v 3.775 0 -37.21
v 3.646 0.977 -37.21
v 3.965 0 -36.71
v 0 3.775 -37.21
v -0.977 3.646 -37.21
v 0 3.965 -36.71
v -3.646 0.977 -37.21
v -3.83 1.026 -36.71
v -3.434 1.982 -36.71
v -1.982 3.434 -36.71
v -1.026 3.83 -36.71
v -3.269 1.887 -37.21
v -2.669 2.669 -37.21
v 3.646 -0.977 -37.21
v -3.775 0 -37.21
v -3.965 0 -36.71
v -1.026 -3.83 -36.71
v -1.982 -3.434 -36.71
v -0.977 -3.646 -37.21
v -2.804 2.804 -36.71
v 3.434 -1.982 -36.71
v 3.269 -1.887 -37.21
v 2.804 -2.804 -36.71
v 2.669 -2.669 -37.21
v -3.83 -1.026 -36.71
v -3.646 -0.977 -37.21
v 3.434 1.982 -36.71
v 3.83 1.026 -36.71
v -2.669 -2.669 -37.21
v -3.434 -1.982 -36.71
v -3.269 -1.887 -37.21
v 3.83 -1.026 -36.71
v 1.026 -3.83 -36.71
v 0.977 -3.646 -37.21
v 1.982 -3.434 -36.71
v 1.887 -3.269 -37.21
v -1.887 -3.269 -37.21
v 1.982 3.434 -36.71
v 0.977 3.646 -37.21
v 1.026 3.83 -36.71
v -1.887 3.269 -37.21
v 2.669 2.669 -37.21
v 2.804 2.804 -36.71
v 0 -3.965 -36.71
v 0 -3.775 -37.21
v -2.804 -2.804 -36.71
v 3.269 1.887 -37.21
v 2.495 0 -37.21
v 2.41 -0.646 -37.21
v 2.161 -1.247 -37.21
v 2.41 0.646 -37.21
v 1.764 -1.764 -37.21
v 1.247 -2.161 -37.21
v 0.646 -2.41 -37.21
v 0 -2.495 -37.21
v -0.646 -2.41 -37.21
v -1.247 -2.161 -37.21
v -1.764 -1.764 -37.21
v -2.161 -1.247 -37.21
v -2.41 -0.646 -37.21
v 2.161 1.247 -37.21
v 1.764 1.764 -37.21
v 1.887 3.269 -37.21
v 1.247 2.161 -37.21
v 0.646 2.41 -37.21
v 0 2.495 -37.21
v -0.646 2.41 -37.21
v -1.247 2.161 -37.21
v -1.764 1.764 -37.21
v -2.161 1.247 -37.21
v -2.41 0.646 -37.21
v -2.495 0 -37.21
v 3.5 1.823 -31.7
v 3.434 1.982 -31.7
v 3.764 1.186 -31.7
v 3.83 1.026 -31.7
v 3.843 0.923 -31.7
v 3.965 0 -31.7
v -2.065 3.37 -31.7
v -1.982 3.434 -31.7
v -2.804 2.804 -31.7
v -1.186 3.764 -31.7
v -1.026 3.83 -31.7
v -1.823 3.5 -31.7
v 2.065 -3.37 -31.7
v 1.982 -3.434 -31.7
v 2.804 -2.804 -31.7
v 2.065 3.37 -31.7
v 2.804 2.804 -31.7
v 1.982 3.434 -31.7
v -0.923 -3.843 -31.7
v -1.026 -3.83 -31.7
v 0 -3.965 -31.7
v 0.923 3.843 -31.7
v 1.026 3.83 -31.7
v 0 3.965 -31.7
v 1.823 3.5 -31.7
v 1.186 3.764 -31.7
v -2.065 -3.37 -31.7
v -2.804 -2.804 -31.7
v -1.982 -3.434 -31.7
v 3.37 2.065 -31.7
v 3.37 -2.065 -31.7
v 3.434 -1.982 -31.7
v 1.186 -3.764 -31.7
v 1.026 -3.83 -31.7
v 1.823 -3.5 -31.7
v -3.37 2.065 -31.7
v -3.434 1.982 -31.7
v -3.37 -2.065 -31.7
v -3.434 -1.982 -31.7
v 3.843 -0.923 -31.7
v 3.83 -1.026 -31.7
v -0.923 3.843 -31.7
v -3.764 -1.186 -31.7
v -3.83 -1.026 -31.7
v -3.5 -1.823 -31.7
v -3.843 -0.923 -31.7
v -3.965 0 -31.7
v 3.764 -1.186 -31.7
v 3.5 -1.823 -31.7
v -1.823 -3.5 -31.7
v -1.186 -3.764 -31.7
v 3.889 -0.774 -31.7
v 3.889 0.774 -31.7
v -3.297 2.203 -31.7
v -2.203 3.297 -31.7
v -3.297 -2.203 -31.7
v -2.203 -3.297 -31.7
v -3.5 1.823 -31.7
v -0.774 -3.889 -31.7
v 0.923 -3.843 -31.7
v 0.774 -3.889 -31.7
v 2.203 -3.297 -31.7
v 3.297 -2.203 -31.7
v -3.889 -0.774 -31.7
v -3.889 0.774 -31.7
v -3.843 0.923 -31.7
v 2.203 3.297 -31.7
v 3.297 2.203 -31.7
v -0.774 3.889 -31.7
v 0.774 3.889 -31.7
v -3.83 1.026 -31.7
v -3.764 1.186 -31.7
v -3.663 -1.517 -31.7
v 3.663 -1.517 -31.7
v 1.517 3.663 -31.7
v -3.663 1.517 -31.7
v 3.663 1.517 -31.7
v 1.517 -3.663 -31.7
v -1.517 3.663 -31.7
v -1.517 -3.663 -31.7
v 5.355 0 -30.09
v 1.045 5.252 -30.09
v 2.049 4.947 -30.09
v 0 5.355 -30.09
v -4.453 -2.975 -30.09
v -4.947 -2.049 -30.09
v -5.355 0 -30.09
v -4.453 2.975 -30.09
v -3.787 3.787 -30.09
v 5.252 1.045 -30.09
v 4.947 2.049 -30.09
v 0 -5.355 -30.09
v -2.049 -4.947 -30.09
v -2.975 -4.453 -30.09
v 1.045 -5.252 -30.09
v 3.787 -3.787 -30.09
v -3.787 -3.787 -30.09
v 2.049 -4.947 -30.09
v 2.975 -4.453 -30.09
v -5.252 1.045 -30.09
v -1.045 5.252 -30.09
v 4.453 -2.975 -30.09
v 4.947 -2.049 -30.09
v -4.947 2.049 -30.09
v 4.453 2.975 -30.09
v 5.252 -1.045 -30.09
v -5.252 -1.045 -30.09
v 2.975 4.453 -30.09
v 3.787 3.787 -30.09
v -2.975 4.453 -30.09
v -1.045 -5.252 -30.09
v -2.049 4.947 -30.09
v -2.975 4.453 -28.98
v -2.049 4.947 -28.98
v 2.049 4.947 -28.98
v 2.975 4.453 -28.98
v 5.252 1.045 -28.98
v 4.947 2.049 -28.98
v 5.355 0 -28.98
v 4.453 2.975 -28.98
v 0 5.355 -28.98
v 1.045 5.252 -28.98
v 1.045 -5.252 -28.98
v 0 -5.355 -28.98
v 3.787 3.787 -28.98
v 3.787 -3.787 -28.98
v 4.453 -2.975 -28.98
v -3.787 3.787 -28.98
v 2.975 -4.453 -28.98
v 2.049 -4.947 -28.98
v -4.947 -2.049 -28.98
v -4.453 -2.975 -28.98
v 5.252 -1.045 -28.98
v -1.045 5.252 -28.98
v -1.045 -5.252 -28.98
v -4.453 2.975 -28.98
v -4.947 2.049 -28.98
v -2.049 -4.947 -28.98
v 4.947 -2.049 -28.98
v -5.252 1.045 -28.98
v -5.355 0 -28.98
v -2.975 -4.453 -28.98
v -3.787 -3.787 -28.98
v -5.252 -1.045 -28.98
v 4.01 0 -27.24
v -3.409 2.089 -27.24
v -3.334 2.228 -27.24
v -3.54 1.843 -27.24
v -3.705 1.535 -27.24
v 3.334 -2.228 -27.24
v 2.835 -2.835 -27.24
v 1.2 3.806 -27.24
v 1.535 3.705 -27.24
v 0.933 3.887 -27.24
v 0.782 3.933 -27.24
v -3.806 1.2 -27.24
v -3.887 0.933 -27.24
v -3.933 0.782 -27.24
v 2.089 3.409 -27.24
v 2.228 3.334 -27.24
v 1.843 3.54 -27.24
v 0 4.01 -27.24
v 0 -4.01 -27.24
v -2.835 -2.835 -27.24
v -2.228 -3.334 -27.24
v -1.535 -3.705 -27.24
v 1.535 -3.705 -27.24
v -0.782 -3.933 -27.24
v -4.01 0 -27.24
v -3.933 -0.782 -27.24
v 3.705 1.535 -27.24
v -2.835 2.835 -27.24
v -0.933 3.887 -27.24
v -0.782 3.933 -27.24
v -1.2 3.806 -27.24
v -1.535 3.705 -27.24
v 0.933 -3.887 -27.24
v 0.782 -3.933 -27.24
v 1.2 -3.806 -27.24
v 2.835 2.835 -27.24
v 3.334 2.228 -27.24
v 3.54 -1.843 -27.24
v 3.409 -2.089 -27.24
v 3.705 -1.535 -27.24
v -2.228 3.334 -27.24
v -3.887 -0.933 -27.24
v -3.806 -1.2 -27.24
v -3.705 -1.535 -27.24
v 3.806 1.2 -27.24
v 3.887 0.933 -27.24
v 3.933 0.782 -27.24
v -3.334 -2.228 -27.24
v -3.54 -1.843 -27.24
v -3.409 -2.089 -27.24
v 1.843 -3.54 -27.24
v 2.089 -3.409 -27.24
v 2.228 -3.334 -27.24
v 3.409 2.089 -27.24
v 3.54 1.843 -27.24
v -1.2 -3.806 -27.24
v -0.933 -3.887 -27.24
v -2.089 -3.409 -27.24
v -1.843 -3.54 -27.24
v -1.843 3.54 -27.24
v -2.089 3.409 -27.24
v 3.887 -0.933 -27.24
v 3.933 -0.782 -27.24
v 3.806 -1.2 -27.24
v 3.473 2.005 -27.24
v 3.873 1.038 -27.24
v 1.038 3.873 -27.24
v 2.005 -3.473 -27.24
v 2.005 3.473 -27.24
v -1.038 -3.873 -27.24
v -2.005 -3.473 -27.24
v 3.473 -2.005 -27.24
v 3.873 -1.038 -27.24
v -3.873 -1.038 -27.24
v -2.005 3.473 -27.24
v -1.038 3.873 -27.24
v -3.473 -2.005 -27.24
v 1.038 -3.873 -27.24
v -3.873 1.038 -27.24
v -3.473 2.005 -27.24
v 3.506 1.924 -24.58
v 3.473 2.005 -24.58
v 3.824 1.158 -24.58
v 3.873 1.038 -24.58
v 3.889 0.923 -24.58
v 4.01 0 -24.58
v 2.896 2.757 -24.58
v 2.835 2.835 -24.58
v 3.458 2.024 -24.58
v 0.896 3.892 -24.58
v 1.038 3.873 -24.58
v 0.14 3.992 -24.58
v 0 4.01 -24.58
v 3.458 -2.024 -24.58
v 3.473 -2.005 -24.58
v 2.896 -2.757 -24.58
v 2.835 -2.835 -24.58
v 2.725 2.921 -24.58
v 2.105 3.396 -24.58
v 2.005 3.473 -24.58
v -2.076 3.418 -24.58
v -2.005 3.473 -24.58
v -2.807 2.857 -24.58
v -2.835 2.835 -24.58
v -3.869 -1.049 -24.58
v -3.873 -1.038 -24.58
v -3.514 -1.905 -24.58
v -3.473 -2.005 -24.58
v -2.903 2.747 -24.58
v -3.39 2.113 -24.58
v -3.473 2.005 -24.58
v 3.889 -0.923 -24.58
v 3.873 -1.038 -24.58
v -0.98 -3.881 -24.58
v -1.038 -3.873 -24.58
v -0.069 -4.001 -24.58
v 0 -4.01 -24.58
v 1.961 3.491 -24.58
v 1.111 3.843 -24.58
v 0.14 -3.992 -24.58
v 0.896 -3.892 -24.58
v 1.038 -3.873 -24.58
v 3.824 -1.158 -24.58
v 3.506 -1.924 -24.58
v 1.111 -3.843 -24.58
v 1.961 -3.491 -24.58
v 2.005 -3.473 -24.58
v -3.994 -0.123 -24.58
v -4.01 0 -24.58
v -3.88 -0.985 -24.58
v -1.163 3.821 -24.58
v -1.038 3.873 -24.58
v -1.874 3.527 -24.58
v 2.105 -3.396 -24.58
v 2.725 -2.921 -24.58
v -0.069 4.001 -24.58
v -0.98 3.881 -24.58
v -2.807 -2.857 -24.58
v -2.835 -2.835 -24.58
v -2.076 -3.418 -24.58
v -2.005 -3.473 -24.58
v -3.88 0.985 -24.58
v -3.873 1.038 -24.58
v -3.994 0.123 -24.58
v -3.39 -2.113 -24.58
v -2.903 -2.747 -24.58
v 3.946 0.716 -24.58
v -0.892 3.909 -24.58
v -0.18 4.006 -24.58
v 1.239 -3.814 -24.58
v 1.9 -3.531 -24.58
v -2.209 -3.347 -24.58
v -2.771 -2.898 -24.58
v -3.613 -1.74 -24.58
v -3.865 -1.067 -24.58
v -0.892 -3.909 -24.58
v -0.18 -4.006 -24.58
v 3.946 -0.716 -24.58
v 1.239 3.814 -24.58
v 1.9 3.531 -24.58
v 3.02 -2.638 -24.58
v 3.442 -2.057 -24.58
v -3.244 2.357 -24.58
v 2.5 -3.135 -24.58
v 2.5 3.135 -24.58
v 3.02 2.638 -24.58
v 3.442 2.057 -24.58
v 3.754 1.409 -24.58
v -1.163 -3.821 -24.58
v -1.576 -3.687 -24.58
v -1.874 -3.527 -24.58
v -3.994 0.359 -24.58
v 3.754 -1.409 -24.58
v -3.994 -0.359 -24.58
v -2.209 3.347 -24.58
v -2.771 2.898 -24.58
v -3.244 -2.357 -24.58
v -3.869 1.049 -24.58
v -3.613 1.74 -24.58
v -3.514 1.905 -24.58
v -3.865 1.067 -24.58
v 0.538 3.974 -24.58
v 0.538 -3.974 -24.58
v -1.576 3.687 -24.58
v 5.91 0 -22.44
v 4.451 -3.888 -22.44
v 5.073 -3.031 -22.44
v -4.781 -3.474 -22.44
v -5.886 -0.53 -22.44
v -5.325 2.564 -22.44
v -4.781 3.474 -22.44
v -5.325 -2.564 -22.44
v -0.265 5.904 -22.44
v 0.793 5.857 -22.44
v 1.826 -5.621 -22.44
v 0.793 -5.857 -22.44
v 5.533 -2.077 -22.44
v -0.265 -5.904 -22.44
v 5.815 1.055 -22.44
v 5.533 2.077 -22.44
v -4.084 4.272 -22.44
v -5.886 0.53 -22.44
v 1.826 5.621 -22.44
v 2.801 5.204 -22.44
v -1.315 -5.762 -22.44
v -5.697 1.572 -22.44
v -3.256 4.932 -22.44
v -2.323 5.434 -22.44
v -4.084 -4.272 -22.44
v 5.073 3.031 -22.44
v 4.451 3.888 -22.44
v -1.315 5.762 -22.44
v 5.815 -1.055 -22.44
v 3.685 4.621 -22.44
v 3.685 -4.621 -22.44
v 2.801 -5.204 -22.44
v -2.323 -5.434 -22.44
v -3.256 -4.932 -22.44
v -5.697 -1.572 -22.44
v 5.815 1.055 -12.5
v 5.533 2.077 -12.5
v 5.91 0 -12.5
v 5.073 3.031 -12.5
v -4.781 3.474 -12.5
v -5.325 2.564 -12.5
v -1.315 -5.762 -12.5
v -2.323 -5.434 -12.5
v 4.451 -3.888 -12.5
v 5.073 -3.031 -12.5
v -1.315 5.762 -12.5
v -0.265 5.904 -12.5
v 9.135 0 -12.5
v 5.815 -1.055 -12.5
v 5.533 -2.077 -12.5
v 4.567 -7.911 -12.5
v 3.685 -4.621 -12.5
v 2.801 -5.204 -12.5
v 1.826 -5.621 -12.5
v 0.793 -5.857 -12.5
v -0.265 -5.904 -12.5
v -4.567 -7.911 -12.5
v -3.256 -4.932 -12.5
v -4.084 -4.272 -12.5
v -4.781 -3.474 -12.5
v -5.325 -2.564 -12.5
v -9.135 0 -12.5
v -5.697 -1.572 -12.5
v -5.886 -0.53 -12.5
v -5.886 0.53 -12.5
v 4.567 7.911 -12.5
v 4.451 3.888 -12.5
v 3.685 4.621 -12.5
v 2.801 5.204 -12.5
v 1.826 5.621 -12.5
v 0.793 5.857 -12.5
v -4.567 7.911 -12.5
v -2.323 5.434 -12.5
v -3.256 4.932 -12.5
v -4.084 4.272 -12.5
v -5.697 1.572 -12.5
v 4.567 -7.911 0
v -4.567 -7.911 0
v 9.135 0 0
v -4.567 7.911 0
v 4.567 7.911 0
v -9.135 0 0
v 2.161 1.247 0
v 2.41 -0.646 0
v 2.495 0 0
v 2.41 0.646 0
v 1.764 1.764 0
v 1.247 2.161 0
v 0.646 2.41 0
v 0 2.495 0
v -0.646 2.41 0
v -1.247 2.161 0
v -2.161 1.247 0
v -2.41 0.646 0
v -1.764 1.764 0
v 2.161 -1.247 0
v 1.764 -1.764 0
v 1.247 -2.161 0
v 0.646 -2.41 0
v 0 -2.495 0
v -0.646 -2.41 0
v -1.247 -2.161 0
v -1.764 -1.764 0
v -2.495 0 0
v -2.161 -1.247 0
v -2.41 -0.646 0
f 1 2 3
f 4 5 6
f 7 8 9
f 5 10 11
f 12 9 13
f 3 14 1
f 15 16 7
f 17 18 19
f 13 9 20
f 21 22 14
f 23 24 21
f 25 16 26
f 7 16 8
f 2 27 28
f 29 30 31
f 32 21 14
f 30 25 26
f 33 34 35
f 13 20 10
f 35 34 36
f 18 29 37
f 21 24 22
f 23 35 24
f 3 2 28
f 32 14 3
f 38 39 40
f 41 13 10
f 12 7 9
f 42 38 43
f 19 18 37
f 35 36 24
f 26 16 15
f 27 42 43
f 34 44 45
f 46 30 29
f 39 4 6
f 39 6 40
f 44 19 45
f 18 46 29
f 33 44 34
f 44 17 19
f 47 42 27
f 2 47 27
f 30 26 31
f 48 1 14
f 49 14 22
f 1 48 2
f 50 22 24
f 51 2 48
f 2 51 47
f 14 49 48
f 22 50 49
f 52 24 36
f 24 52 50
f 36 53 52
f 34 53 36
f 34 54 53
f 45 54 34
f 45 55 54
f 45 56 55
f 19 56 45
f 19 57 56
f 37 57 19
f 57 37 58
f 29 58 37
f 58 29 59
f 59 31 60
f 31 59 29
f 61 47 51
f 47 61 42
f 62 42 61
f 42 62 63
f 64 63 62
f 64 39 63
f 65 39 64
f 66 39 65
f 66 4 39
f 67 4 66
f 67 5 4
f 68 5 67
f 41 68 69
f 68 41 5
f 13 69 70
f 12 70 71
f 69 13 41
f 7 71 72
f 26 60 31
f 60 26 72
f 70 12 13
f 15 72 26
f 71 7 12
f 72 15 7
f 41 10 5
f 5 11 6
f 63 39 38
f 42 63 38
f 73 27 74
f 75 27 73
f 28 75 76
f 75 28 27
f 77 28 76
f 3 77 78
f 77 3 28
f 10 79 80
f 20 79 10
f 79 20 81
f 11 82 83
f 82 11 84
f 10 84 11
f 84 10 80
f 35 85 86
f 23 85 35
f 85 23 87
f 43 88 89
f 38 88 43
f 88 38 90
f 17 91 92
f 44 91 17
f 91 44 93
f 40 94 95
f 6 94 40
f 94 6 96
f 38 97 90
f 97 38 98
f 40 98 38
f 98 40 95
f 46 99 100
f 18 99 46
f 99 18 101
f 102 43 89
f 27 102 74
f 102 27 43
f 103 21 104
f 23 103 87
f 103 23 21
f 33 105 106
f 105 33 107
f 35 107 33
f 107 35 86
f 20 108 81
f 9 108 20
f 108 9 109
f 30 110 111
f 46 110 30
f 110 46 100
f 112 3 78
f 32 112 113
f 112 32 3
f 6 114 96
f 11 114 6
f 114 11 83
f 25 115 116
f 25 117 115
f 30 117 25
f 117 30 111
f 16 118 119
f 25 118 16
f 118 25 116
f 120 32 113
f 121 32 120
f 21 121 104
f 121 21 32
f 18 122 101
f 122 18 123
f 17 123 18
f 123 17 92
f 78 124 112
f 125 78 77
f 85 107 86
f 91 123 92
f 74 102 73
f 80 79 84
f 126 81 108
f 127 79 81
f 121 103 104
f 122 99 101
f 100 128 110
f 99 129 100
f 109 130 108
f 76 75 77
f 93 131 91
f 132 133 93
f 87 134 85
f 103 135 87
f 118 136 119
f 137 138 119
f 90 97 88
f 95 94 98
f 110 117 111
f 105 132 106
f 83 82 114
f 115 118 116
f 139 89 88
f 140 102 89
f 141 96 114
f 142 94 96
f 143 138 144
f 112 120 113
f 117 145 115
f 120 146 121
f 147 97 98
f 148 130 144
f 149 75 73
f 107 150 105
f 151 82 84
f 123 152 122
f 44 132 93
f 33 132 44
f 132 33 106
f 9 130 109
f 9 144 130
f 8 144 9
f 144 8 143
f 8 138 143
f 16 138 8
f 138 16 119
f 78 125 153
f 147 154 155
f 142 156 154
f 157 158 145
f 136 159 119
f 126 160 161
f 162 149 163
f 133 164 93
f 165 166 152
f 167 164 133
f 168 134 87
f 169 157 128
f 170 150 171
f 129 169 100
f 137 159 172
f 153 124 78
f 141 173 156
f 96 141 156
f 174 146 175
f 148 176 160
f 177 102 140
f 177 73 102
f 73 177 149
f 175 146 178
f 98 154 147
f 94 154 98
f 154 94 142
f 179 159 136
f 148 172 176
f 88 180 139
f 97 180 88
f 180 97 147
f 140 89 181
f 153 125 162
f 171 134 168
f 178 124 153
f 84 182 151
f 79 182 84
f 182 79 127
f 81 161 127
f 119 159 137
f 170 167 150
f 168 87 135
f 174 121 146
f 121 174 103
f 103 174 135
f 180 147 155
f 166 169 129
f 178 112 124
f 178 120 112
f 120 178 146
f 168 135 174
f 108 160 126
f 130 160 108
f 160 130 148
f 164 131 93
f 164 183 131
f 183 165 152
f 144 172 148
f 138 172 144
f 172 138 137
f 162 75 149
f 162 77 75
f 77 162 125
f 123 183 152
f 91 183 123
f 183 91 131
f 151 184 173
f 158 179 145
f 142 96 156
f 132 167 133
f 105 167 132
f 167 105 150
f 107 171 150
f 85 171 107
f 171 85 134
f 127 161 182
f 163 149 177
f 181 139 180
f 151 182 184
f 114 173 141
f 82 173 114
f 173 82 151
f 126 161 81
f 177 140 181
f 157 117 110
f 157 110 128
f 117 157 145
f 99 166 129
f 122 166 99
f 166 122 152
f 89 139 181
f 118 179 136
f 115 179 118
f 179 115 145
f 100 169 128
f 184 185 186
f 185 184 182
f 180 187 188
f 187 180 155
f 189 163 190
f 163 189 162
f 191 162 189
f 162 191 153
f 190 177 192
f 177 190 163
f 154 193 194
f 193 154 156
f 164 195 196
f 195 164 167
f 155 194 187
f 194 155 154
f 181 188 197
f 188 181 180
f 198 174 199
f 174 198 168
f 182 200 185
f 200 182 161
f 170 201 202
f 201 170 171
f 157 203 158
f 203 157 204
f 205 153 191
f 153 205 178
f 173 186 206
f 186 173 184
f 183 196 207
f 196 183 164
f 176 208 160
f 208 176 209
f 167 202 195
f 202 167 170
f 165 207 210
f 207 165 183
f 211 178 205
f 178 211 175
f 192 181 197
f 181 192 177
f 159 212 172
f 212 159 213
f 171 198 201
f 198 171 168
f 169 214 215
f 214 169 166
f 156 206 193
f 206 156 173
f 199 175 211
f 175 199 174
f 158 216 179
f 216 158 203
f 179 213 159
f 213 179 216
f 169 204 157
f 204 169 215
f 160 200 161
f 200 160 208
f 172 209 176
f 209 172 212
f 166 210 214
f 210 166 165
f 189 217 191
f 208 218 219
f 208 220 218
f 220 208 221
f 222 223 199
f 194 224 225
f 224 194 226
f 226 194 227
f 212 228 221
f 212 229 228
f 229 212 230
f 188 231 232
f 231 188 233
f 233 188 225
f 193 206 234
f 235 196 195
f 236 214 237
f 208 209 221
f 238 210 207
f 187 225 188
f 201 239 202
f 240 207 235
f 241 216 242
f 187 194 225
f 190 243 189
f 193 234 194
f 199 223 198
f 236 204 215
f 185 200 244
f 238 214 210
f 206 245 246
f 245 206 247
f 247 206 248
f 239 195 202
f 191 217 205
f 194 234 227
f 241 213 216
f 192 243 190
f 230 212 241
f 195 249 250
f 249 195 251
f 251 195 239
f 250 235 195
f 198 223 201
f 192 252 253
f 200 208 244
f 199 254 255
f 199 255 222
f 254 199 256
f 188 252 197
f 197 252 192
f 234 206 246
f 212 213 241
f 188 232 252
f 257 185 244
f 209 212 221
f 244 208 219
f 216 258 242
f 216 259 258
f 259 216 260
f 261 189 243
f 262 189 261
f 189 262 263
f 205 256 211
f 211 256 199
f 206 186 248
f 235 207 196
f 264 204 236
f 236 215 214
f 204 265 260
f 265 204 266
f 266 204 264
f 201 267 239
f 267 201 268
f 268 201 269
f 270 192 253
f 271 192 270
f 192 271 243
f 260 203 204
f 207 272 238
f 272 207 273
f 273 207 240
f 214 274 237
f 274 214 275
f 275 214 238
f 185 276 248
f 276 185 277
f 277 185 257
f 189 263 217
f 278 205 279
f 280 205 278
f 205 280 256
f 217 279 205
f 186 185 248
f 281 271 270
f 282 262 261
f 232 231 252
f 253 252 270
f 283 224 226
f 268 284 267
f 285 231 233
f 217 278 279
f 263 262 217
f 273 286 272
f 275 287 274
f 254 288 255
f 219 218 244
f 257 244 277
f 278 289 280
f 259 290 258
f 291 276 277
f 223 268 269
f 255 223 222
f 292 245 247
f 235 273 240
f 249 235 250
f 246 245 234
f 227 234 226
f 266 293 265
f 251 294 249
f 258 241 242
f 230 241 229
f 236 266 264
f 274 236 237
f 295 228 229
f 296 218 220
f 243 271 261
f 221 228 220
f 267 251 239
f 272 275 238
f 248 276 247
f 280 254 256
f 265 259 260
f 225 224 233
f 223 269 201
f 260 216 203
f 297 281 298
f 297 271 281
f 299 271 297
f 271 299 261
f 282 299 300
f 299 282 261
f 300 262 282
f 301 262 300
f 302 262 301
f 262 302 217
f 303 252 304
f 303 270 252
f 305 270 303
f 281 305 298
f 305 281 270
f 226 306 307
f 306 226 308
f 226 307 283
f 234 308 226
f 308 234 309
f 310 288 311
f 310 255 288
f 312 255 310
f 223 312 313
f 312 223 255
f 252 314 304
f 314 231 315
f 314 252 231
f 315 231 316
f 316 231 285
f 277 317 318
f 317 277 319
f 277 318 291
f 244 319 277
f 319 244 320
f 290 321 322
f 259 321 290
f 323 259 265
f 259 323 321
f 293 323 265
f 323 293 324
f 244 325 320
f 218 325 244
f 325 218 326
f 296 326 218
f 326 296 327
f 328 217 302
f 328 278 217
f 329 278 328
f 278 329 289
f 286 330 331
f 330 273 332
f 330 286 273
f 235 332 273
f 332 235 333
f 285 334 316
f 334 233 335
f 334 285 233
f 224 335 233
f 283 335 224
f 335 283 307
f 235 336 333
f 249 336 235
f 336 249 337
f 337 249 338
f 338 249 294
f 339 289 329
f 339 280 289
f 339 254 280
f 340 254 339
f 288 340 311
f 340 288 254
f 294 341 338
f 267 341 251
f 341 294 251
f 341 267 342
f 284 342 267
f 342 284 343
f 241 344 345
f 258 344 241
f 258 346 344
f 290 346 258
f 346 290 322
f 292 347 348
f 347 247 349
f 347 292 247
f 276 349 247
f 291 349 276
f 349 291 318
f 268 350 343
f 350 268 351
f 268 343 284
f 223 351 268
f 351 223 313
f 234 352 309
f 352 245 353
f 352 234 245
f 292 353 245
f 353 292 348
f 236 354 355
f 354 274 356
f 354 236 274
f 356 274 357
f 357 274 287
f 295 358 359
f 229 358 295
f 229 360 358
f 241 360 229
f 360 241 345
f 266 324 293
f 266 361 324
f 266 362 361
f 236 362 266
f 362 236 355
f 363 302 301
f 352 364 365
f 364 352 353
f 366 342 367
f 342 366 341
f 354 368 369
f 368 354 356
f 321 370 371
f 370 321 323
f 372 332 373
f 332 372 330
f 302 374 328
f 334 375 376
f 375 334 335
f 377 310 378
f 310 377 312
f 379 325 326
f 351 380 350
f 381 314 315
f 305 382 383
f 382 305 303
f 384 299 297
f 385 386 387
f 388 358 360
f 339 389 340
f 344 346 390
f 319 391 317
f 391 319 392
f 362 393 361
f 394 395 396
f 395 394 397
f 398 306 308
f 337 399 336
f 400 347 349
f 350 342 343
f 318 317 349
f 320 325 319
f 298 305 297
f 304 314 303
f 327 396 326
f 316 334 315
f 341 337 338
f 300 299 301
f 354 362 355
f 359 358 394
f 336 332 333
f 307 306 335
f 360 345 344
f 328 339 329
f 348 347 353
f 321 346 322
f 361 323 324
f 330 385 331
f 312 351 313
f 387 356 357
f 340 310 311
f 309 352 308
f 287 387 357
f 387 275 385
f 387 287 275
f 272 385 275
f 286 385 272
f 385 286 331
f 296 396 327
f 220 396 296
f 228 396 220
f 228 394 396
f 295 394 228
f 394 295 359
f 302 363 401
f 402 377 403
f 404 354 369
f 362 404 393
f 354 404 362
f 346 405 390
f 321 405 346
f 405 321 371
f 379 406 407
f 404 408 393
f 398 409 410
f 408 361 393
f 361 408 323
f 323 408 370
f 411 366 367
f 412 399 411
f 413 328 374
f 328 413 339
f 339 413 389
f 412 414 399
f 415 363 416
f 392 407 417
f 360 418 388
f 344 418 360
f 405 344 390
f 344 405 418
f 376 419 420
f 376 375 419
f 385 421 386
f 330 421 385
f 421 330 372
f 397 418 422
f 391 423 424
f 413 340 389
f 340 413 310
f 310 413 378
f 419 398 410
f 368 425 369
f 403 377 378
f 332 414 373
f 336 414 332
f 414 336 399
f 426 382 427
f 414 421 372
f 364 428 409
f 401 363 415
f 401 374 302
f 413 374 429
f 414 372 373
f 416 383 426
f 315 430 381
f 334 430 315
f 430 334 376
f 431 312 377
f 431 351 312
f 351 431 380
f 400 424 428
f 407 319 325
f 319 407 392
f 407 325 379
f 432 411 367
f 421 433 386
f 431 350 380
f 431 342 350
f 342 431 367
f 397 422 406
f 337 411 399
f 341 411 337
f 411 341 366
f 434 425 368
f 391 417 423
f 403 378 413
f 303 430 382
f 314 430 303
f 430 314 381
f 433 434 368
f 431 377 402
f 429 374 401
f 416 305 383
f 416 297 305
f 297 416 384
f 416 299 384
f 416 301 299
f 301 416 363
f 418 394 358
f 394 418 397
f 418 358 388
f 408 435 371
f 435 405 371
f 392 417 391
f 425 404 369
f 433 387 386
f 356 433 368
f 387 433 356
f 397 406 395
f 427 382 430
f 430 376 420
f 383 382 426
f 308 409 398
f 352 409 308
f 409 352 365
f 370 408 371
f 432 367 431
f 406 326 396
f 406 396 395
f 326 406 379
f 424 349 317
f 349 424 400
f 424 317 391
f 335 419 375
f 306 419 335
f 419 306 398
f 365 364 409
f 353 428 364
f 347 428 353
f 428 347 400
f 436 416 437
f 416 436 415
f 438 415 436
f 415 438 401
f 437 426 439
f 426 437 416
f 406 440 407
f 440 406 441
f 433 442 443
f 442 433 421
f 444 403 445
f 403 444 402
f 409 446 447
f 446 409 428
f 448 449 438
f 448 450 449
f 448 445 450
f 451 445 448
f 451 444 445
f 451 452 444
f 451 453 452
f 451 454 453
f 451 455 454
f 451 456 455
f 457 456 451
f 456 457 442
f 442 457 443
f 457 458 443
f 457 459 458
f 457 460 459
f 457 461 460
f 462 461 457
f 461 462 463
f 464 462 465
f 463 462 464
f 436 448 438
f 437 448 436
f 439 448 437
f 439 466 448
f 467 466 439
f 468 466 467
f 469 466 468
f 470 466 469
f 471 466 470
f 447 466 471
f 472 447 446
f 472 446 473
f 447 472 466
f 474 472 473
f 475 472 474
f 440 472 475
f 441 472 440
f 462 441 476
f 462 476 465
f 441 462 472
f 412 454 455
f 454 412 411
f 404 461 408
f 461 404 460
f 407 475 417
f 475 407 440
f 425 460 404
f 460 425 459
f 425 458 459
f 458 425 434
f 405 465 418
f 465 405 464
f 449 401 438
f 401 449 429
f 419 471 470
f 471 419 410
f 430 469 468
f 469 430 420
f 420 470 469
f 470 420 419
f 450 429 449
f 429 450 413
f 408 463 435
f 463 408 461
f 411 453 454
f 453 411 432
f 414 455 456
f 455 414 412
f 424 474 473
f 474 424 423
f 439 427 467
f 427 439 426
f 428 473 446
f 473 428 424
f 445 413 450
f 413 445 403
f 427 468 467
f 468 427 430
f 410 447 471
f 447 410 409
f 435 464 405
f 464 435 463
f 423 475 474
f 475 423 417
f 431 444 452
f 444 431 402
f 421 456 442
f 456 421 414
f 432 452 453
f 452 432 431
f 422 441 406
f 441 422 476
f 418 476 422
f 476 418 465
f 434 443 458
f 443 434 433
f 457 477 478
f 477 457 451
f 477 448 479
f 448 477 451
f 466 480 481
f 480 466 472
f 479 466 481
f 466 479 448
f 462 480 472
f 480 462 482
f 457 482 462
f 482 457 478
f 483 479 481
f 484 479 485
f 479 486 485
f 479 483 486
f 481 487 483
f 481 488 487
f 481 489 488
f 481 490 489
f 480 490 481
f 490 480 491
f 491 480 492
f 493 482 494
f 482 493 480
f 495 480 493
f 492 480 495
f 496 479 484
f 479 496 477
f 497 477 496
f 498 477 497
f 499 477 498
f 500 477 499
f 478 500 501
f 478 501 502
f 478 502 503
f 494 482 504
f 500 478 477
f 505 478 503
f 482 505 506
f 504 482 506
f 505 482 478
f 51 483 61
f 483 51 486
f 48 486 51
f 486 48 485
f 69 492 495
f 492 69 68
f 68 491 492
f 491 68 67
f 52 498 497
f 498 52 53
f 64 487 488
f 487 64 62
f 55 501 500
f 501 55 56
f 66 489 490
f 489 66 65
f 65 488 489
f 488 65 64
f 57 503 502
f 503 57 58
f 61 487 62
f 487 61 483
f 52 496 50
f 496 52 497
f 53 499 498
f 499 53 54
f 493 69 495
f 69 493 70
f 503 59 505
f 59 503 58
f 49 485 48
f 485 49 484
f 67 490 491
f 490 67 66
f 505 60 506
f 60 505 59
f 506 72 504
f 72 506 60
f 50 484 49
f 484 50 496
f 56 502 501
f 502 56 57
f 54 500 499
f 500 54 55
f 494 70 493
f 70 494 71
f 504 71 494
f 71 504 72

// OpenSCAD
// This is a fitting for connecting pneumatic air tools to an air hose.  Specifically, this is an 
// ARO interchange 1/4" (inside) diameter male connection.  
//
// Though there are a lot of different air fittings, this is the most common connector in the USA, 
// as found in most hardware stores.
//
// CAUTION:  It should go without saying, but I'm going to say it anyway.  3D printed parts will 
// leak unless treated, and may fail under pressure regardless.
//
// Liscenced under Creative Commons + Attribution license.
//
// To fulfill the attribution requirement, please provide a link to one of:
// http://theheadlesssourceman.wordpress.com/2018/05/27/air-fitting/
// https://www.thingiverse.com/thing:2933158


// resolution 1=low(aka 1x) 2=mid 3=high
resfactor=2;

// make $fn more automatic
function myfn(r)=max(3*r,12)*resfactor;
module cyl(r=undef,h=undef,r1=undef,r2=undef){cylinder(r=r,h=h,r1=r1,r2=r2,$fn=myfn(r!=undef?r:max(r1,r2)));}
module circ(r=undef){circle(r=r,$fn=myfn(r));}
module ball(r=undef){sphere(r=r,$fn=myfn(r));}

// not including hex area:
airfitting_size=[11.82,11.82,0.5+5.01+1.61+1.11+1.74+2.66+2.14+9.94];

module airfitting(hex_length=12.5){
	// specifically, an ARO interchange 1/4 inch plug
	translate([0,0,-(0.5+5.01+1.61+1.11+1.74+2.66+2.14+9.94+hex_length)]) difference(){
		union(){
			cyl(r1=7.55/2,r2=7.93/2,h=0.5);
			translate([0,0,0.5]) cyl(r=7.93/2,h=5.01);
			translate([0,0,0.5+5.01]) cyl(r1=7.93/2,r2=10.71/2,h=1.61);
			translate([0,0,0.5+5.01+1.61]) cyl(r=10.71/2,h=1.11);
			translate([0,0,0.5+5.01+1.61+1.11]) cyl(r1=10.71/2,r2=8.02/2,h=1.74);
			translate([0,0,0.5+5.01+1.61+1.11+1.74]) cyl(r=8.02/2,h=2.66);
			translate([0,0,0.5+5.01+1.61+1.11+1.74+2.66]) cyl(r1=8.02/2,r2=11.82/2,h=2.14);
			translate([0,0,0.5+5.01+1.61+1.11+1.74+2.66+2.14]) cyl(r=11.82/2,h=9.94);
			translate([0,0,0.5+5.01+1.61+1.11+1.74+2.66+2.14+9.94]) cylinder(r=18.27/2,h=hex_length,$fn=6);
		}
		translate([0,0,-0.5]) cyl(r=4.99/2,h=0.5+5.01+1.61+1.11+1.74+2.66+2.14+9.94+hex_length+1.0);
	}
}

//mirror([0,0,1])
color([1.0,0.9,0.75]) airfitting();
